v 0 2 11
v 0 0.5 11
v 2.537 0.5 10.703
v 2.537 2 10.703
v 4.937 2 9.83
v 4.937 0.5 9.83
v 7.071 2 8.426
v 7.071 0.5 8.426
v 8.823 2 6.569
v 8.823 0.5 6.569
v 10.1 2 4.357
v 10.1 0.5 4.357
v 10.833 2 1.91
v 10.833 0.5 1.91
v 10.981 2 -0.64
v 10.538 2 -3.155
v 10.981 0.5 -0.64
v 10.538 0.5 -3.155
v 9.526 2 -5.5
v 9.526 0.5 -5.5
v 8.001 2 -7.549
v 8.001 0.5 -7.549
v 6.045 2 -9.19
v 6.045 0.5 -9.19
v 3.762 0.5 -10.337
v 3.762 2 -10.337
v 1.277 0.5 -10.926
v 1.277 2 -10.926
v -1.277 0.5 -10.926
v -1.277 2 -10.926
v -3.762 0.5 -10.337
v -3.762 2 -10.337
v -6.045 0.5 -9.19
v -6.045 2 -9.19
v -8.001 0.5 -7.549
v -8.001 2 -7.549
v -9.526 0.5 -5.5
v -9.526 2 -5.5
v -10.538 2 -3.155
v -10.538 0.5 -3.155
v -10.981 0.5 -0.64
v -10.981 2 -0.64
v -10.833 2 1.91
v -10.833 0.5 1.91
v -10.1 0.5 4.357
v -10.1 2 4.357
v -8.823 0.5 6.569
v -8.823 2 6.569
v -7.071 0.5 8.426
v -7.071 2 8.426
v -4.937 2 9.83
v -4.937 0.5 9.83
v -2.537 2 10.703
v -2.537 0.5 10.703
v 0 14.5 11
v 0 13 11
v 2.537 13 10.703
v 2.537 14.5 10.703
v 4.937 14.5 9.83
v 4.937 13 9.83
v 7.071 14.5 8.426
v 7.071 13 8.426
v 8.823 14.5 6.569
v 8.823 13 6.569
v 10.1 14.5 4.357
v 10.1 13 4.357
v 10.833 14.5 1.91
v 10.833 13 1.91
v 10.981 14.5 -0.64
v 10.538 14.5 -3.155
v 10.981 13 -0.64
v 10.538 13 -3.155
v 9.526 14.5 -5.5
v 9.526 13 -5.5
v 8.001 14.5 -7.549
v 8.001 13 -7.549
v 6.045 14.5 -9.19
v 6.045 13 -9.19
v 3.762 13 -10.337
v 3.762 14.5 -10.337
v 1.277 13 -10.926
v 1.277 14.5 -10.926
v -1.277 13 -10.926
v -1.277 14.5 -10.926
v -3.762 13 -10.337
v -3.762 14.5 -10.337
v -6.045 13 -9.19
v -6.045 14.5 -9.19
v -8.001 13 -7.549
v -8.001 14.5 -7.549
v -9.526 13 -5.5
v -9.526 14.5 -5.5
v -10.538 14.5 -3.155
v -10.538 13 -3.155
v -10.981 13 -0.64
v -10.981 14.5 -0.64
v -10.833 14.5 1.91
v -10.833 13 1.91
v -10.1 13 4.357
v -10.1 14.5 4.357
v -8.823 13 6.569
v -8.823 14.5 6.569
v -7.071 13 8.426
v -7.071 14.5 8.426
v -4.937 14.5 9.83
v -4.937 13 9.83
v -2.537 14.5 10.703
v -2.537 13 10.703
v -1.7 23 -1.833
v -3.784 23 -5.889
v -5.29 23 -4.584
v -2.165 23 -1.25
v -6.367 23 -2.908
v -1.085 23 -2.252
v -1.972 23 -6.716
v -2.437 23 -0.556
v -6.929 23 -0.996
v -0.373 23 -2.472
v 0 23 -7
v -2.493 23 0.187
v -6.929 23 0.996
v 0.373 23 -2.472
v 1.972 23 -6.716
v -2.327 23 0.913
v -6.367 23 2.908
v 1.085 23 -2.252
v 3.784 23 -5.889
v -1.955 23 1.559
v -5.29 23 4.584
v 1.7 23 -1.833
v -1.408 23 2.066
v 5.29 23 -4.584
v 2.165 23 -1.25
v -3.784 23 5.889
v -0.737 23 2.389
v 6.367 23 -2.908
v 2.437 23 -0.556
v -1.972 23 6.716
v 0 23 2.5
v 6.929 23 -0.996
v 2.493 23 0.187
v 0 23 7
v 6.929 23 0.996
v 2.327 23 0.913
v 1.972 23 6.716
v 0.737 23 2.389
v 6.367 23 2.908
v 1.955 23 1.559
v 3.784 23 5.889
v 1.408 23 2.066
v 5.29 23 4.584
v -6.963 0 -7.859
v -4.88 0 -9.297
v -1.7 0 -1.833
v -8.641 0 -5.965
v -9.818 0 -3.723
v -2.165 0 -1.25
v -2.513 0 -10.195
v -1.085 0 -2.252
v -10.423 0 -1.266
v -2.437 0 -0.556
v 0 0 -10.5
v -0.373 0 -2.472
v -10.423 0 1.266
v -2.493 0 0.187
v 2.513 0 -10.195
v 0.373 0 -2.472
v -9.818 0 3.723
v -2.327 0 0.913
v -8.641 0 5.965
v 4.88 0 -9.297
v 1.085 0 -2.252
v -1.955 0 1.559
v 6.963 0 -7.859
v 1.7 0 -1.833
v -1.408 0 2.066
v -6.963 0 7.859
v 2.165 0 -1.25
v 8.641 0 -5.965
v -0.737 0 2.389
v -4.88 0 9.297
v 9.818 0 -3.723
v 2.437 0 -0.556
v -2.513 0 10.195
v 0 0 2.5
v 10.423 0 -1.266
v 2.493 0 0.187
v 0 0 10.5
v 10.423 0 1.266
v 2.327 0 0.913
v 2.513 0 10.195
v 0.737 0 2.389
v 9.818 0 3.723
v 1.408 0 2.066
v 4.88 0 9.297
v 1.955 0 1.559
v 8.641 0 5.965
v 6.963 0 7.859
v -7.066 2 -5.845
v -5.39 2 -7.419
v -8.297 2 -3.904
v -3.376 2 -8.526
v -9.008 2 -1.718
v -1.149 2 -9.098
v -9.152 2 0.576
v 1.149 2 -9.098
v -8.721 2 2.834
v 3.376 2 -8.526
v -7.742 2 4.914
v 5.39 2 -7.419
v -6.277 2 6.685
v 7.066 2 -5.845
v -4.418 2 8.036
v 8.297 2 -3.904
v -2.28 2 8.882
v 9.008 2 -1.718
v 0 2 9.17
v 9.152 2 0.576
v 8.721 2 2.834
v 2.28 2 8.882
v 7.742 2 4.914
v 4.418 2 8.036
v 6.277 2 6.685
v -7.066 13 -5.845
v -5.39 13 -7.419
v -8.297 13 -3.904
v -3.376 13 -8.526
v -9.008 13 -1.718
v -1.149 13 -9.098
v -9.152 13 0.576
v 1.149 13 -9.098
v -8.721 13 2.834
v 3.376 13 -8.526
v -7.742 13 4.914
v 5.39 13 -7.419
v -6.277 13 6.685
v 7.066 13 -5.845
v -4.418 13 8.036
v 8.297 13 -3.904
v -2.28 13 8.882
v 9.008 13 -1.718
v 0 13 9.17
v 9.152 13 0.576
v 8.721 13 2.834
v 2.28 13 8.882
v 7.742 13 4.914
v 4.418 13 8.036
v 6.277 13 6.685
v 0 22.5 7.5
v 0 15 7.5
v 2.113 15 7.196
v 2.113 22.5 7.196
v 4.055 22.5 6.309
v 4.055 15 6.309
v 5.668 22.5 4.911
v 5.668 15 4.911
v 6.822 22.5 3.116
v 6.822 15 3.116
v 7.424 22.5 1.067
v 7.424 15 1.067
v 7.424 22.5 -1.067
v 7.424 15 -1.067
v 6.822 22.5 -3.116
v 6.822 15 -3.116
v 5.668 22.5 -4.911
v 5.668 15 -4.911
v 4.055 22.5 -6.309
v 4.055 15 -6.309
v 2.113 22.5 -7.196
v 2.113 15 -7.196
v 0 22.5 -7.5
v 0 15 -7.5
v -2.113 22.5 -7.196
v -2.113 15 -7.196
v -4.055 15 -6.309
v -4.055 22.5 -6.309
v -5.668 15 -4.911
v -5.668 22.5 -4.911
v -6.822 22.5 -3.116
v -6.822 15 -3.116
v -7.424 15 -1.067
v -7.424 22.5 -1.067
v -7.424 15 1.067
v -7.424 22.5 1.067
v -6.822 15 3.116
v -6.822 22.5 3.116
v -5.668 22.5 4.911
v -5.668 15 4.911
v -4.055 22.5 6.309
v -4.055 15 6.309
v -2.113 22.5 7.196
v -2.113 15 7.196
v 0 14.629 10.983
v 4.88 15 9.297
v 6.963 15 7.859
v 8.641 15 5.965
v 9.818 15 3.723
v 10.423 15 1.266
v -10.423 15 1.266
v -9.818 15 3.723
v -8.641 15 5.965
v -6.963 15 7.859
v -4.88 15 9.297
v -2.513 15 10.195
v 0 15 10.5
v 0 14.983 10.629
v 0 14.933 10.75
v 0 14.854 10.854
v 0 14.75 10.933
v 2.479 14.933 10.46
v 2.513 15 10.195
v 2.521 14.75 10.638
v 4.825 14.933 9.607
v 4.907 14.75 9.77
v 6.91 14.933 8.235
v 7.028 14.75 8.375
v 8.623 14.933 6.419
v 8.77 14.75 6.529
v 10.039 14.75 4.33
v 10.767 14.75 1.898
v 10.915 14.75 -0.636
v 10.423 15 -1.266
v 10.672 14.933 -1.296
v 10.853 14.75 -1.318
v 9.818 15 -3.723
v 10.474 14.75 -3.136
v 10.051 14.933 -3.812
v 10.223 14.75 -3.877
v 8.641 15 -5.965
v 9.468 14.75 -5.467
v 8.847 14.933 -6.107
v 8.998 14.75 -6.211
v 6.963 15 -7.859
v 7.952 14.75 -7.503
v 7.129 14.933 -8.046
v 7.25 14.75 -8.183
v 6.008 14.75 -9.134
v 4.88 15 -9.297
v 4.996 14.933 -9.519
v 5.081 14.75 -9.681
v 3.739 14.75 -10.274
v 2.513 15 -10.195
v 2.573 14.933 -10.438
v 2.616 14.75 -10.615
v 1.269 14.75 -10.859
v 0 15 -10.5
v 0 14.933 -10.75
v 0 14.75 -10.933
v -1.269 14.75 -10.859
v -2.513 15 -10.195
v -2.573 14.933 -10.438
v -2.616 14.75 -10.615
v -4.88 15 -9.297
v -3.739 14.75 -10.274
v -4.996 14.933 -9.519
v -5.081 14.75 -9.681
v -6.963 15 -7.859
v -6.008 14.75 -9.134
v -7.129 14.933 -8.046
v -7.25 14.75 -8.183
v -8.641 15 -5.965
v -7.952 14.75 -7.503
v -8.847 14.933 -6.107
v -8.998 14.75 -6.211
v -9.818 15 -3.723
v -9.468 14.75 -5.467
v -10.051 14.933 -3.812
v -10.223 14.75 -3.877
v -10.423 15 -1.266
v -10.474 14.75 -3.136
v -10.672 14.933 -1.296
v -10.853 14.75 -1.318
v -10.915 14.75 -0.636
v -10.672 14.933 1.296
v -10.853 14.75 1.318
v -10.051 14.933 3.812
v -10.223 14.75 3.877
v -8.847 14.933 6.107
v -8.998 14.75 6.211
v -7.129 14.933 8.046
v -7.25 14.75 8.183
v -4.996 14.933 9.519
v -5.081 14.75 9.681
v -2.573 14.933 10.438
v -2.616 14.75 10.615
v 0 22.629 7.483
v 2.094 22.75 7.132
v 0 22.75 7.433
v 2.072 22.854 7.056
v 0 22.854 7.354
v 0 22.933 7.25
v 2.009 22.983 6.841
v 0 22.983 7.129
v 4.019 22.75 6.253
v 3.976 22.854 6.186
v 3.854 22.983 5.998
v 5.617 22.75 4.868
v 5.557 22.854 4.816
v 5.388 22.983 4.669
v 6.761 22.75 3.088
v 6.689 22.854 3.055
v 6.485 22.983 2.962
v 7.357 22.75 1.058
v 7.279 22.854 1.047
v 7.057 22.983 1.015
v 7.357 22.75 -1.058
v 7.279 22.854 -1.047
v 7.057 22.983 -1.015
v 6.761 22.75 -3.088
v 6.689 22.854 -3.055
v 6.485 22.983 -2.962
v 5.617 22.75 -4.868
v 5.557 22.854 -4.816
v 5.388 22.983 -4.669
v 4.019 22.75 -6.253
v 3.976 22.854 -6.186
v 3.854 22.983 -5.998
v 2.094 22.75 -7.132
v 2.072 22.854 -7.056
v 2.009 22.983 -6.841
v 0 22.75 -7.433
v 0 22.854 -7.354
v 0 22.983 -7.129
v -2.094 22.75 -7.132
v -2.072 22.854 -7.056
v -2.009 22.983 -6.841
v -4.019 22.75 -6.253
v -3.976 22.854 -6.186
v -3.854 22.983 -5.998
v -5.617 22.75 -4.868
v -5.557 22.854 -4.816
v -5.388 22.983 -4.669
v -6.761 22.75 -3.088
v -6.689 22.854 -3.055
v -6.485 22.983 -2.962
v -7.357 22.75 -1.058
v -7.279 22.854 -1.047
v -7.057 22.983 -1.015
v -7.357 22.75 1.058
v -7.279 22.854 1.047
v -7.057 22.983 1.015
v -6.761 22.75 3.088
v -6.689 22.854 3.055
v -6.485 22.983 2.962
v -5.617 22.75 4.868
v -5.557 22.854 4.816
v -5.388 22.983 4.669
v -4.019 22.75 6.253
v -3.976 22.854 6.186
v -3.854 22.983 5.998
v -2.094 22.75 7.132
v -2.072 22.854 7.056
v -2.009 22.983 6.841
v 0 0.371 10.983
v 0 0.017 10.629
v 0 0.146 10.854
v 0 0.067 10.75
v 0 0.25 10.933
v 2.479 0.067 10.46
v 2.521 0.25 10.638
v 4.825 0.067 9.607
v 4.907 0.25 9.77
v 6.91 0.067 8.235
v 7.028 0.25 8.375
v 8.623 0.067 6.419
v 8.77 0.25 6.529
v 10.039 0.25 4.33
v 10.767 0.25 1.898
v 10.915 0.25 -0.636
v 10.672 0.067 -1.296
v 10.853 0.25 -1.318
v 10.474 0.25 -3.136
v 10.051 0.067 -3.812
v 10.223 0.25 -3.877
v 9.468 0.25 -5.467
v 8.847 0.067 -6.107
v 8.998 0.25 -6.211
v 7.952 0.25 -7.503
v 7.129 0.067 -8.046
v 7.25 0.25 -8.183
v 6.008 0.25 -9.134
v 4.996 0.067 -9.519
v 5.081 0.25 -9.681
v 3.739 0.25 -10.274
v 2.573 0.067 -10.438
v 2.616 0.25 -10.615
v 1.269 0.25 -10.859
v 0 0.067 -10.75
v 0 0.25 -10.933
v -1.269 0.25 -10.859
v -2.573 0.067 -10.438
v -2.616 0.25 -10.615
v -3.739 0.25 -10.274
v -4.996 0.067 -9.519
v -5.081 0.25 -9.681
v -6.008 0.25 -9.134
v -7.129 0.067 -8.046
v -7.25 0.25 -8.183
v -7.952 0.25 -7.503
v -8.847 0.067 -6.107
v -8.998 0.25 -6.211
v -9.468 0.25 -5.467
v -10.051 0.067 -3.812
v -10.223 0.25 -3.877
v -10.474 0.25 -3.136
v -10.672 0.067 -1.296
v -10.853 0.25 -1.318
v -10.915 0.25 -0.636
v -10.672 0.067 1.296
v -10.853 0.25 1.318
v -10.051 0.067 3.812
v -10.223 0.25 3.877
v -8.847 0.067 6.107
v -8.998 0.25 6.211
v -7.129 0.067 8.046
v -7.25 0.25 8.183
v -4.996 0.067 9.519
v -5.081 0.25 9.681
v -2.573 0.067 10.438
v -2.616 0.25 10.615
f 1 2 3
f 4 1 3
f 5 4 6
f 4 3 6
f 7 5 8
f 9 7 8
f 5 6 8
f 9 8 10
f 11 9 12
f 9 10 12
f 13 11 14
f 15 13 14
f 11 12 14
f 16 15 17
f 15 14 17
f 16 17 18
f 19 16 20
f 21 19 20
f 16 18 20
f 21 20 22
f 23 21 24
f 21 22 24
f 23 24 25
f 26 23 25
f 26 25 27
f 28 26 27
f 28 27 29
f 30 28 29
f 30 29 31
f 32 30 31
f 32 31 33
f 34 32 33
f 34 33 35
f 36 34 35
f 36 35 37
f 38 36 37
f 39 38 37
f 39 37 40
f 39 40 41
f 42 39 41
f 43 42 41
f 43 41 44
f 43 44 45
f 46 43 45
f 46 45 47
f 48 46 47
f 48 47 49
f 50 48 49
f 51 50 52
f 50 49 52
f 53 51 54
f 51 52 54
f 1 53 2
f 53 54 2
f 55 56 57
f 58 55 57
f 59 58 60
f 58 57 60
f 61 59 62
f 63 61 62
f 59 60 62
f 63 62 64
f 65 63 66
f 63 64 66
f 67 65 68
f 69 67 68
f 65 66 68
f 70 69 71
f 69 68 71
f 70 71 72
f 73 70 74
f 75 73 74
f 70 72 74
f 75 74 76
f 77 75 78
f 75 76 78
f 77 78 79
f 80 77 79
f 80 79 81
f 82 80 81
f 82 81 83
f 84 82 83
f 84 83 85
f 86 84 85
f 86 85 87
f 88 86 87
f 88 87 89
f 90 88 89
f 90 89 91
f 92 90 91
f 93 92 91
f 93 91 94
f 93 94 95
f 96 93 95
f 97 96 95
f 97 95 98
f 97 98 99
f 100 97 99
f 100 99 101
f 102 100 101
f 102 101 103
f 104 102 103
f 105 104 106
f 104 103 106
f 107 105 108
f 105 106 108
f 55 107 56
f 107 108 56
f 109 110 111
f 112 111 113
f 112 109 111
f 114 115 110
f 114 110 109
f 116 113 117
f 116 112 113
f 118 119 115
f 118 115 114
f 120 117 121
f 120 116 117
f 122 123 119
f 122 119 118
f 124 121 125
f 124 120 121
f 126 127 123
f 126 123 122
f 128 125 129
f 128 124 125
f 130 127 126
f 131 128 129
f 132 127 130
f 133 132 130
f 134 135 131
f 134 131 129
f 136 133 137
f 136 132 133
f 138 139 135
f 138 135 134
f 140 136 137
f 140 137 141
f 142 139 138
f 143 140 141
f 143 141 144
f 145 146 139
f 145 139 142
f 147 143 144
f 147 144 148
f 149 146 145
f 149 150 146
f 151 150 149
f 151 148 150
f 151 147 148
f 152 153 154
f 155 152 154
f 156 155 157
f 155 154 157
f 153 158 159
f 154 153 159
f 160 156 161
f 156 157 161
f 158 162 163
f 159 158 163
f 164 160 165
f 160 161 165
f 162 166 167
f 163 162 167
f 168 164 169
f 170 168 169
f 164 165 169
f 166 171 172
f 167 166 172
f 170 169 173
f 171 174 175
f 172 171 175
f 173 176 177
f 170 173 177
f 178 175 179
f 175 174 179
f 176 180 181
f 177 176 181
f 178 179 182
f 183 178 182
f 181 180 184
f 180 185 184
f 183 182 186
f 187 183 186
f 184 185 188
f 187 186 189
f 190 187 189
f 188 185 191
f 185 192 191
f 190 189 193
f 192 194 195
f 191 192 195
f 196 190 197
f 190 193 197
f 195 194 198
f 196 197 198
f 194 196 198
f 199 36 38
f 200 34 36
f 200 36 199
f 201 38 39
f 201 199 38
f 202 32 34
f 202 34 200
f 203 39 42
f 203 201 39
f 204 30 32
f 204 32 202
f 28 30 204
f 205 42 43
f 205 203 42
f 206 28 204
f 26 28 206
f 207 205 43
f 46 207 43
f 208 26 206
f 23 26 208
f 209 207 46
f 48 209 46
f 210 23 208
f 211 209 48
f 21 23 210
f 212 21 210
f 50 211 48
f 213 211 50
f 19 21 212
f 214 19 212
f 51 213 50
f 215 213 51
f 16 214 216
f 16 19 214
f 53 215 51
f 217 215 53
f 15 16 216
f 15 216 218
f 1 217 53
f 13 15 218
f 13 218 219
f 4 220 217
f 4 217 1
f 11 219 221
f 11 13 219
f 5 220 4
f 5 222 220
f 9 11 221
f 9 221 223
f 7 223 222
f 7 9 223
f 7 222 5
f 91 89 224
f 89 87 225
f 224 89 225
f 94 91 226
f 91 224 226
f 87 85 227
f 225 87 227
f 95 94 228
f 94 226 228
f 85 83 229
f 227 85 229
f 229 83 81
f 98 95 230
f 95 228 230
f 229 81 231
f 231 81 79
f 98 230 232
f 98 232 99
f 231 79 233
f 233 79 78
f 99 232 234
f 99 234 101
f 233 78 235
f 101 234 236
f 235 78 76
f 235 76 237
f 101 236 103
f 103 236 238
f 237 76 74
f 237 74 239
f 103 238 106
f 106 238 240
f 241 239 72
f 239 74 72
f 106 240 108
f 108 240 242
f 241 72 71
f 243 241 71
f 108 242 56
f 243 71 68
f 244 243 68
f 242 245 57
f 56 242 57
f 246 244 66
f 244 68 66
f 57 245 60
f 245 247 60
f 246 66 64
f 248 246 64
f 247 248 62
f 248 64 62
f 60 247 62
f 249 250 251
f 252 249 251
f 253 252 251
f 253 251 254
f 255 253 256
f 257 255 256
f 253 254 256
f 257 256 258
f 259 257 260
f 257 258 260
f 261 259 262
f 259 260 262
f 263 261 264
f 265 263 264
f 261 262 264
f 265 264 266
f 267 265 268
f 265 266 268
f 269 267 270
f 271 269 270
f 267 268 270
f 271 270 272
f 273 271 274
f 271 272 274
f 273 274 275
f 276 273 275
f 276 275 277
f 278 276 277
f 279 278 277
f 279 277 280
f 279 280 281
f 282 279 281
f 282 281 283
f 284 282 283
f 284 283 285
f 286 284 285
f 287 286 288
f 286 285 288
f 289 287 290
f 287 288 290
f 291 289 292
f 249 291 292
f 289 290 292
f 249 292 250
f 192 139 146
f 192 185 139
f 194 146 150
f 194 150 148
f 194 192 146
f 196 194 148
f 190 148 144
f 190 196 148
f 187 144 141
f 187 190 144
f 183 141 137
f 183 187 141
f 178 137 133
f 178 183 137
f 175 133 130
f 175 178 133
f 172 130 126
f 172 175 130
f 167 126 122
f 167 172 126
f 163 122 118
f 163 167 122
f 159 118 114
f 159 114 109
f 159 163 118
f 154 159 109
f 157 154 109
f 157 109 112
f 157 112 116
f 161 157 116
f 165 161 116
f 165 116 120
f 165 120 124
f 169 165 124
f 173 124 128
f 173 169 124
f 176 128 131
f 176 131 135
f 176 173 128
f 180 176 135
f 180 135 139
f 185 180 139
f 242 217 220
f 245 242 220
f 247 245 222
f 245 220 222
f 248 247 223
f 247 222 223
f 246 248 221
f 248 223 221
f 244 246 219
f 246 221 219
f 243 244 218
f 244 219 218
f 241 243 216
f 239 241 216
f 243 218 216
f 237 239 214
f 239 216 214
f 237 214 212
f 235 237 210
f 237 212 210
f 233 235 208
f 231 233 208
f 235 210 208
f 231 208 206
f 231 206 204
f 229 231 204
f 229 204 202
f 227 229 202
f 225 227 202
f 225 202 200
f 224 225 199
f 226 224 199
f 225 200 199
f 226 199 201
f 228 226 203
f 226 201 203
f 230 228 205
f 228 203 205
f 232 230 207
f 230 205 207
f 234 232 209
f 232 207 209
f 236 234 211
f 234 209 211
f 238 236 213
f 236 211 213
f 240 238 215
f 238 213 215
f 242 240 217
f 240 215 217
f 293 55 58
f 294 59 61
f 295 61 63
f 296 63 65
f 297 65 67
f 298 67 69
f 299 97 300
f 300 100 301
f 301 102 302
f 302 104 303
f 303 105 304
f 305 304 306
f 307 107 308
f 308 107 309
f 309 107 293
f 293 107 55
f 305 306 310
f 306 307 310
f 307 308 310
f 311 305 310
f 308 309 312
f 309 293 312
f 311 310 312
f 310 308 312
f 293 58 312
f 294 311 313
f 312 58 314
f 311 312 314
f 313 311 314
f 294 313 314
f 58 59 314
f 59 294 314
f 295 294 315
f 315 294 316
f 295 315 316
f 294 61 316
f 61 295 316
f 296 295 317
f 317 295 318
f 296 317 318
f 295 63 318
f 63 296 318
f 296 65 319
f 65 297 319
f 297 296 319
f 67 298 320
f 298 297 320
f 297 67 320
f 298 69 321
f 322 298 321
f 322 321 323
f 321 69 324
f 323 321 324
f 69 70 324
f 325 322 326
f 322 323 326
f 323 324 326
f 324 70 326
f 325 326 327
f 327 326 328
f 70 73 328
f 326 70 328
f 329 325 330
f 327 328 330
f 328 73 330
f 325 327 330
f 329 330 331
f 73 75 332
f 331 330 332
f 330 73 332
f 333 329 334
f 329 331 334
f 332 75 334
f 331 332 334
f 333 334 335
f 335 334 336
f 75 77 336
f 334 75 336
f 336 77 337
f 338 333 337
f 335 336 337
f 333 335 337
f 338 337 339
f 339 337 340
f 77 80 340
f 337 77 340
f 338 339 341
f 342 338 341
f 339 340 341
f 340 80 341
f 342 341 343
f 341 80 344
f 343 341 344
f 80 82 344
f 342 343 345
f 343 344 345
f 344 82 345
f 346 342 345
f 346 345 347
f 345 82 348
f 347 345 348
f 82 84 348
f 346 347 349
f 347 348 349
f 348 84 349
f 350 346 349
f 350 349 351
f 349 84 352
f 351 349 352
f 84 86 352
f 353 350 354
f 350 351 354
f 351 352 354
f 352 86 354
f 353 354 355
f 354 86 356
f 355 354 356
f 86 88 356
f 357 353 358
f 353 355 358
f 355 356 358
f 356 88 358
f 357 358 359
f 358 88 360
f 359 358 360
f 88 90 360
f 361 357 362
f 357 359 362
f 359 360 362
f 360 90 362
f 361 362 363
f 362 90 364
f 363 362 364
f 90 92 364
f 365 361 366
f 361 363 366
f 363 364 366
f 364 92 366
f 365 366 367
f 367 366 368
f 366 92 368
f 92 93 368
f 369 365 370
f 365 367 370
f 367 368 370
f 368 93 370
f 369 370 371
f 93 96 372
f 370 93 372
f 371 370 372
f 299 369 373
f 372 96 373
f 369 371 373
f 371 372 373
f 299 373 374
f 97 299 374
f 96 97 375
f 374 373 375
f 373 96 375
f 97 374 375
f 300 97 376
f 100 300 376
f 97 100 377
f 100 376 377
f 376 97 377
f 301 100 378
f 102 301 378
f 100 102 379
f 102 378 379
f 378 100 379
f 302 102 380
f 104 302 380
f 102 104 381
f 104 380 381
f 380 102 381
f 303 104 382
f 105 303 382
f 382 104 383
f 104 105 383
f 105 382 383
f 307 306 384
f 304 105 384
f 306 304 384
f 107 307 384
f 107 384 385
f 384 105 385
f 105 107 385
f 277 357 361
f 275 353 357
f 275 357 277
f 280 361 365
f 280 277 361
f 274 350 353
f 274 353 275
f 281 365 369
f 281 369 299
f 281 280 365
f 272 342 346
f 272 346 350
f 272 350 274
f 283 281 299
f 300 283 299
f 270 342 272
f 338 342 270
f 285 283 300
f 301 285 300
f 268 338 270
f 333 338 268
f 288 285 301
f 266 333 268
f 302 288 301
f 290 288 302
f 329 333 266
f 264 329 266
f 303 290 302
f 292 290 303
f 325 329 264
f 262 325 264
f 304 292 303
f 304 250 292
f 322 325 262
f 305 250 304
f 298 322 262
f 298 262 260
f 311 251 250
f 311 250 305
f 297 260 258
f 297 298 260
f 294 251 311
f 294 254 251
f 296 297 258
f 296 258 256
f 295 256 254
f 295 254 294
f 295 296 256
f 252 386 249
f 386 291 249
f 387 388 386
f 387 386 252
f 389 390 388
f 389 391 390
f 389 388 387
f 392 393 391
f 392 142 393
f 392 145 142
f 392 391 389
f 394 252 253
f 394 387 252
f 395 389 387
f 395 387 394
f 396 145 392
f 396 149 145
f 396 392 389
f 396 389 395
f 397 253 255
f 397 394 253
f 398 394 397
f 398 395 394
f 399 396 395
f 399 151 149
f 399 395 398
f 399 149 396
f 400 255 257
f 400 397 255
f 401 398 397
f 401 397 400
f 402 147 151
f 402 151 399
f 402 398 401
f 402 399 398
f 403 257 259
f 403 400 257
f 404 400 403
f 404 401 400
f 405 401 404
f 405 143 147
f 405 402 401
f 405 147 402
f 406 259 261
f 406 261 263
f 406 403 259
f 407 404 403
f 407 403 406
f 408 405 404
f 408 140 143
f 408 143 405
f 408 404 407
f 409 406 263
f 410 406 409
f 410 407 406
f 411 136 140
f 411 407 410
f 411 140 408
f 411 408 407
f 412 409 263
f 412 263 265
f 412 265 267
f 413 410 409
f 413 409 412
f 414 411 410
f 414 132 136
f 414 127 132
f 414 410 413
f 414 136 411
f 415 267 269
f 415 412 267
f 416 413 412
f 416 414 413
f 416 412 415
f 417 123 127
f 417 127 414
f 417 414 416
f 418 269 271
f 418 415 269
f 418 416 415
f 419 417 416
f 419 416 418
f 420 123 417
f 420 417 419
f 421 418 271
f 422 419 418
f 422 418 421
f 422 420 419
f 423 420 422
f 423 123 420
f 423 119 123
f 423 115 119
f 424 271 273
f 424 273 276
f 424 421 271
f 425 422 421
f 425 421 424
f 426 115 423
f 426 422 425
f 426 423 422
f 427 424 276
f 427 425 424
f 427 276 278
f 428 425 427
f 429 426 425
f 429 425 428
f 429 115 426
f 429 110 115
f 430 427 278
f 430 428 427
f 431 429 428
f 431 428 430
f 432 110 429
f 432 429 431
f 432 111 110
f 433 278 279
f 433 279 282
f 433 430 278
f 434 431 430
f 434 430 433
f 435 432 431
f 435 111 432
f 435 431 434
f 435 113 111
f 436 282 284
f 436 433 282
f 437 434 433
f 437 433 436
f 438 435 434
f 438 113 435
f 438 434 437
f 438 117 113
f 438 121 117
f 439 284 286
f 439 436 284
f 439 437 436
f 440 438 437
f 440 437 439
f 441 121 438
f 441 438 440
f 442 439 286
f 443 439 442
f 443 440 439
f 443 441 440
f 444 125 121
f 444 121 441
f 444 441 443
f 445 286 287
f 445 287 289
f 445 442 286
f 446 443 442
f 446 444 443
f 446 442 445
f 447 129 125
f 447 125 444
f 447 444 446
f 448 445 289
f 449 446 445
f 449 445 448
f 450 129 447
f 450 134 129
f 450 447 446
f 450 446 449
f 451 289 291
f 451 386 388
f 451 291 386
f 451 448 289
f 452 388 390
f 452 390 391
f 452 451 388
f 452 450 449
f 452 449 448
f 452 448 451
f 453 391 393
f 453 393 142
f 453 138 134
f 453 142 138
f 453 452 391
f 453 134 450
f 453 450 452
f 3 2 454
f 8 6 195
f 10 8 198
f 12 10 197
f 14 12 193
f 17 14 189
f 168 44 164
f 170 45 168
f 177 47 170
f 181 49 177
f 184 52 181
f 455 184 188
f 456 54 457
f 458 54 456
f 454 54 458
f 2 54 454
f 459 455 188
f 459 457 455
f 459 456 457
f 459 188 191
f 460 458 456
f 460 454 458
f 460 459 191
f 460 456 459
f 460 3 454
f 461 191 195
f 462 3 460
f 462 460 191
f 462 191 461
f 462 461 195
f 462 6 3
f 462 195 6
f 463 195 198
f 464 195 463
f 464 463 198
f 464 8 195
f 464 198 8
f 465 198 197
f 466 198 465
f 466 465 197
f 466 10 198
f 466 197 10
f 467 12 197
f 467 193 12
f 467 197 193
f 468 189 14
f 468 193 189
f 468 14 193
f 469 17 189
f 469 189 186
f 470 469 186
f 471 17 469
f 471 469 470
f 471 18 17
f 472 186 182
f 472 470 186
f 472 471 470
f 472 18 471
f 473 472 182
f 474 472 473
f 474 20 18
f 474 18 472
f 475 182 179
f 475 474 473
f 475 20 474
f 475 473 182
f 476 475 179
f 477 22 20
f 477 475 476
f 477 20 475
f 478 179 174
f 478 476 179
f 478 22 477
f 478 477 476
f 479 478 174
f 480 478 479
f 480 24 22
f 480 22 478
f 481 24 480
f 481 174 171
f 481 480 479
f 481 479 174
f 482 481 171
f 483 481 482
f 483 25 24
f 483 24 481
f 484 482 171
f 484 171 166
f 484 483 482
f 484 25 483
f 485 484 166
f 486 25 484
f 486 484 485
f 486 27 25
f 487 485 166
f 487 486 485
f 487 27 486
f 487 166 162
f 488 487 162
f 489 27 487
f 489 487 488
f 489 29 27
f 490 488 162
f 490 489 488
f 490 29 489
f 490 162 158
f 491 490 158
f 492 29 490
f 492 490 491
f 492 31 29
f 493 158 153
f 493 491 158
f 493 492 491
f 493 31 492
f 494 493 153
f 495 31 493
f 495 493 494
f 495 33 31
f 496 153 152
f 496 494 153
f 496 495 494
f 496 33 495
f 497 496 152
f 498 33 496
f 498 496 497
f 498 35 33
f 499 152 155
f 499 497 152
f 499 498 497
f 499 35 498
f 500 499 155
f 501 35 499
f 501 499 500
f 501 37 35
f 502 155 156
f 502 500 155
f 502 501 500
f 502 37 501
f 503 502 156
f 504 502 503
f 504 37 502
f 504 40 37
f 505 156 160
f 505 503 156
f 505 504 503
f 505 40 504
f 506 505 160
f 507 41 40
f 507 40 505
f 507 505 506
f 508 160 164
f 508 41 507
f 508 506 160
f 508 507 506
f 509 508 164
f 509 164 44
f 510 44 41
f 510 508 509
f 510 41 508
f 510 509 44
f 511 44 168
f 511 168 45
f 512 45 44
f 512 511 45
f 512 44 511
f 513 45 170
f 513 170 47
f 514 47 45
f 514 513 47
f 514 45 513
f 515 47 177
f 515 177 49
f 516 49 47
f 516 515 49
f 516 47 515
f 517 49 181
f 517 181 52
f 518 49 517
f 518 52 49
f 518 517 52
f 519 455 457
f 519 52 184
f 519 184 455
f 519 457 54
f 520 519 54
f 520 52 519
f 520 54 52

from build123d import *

# Parameters (mm, degrees)
SKETCH_1_R          = 11
SKETCH_1_R_2        = 2.5
EXTRUDE_1_DEPTH     = 15
SKETCH_2_R          = 7.5
SKETCH_2_R_2        = 2.5
EXTRUDE_2_DEPTH     = 8
CUT_EXTRUDE_START   = 2
SKETCH_3_R          = 11
SKETCH_3_R_2        = 9.17
CUT_EXTRUDE_1_DEPTH = 11
FILLET_1_R          = 0.5


with BuildPart() as part:
    # 草图1 → 凸台-拉伸1 (new body)
    with BuildSketch(Plane(origin=(0, 0, 0), x_dir=(1, 0, 0), z_dir=(0, 1, 0))):
        with Locations(Location((0, 0, 0), (0, 0, 270))):
            Circle(SKETCH_1_R)
        with Locations(Location((0, 0, 0), (0, 0, 270))):
            Circle(SKETCH_1_R_2, mode=Mode.SUBTRACT)
    extrude(amount=EXTRUDE_1_DEPTH)

    # 草图2 → 凸台-拉伸2 (add)
    with BuildSketch(Plane(origin=(0, 15, 0), x_dir=(1, 0, 0), z_dir=(0, 1, 0))):
        with Locations(Location((0, 0, 0), (0, 0, 270))):
            Circle(SKETCH_2_R)
        with Locations(Location((0, 0, 0), (0, 0, 270))):
            Circle(SKETCH_2_R_2, mode=Mode.SUBTRACT)
    extrude(amount=EXTRUDE_2_DEPTH)

    # 草图3 → 切除-拉伸1 (cut)
    with BuildSketch(Plane(origin=(0, 0, 0), x_dir=(1, 0, 0), z_dir=(0, 1, 0)).offset(CUT_EXTRUDE_START)):
        with Locations(Location((0, 0, 0), (0, 0, 270))):
            Circle(SKETCH_3_R)
        with Locations(Location((0, 0, 0), (0, 0, 270))):
            Circle(SKETCH_3_R_2, mode=Mode.SUBTRACT)
    extrude(amount=CUT_EXTRUDE_1_DEPTH, mode=Mode.SUBTRACT)

    # 圆角1
    fillet_1_edges = [part.edges().sort_by_distance(p)[0] for p in [
        (0, 0, -11),
        (0, 15, -11),
        (0, 23, -7.5),
    ]]
    fillet(fillet_1_edges, radius=FILLET_1_R)


solid = part.part
